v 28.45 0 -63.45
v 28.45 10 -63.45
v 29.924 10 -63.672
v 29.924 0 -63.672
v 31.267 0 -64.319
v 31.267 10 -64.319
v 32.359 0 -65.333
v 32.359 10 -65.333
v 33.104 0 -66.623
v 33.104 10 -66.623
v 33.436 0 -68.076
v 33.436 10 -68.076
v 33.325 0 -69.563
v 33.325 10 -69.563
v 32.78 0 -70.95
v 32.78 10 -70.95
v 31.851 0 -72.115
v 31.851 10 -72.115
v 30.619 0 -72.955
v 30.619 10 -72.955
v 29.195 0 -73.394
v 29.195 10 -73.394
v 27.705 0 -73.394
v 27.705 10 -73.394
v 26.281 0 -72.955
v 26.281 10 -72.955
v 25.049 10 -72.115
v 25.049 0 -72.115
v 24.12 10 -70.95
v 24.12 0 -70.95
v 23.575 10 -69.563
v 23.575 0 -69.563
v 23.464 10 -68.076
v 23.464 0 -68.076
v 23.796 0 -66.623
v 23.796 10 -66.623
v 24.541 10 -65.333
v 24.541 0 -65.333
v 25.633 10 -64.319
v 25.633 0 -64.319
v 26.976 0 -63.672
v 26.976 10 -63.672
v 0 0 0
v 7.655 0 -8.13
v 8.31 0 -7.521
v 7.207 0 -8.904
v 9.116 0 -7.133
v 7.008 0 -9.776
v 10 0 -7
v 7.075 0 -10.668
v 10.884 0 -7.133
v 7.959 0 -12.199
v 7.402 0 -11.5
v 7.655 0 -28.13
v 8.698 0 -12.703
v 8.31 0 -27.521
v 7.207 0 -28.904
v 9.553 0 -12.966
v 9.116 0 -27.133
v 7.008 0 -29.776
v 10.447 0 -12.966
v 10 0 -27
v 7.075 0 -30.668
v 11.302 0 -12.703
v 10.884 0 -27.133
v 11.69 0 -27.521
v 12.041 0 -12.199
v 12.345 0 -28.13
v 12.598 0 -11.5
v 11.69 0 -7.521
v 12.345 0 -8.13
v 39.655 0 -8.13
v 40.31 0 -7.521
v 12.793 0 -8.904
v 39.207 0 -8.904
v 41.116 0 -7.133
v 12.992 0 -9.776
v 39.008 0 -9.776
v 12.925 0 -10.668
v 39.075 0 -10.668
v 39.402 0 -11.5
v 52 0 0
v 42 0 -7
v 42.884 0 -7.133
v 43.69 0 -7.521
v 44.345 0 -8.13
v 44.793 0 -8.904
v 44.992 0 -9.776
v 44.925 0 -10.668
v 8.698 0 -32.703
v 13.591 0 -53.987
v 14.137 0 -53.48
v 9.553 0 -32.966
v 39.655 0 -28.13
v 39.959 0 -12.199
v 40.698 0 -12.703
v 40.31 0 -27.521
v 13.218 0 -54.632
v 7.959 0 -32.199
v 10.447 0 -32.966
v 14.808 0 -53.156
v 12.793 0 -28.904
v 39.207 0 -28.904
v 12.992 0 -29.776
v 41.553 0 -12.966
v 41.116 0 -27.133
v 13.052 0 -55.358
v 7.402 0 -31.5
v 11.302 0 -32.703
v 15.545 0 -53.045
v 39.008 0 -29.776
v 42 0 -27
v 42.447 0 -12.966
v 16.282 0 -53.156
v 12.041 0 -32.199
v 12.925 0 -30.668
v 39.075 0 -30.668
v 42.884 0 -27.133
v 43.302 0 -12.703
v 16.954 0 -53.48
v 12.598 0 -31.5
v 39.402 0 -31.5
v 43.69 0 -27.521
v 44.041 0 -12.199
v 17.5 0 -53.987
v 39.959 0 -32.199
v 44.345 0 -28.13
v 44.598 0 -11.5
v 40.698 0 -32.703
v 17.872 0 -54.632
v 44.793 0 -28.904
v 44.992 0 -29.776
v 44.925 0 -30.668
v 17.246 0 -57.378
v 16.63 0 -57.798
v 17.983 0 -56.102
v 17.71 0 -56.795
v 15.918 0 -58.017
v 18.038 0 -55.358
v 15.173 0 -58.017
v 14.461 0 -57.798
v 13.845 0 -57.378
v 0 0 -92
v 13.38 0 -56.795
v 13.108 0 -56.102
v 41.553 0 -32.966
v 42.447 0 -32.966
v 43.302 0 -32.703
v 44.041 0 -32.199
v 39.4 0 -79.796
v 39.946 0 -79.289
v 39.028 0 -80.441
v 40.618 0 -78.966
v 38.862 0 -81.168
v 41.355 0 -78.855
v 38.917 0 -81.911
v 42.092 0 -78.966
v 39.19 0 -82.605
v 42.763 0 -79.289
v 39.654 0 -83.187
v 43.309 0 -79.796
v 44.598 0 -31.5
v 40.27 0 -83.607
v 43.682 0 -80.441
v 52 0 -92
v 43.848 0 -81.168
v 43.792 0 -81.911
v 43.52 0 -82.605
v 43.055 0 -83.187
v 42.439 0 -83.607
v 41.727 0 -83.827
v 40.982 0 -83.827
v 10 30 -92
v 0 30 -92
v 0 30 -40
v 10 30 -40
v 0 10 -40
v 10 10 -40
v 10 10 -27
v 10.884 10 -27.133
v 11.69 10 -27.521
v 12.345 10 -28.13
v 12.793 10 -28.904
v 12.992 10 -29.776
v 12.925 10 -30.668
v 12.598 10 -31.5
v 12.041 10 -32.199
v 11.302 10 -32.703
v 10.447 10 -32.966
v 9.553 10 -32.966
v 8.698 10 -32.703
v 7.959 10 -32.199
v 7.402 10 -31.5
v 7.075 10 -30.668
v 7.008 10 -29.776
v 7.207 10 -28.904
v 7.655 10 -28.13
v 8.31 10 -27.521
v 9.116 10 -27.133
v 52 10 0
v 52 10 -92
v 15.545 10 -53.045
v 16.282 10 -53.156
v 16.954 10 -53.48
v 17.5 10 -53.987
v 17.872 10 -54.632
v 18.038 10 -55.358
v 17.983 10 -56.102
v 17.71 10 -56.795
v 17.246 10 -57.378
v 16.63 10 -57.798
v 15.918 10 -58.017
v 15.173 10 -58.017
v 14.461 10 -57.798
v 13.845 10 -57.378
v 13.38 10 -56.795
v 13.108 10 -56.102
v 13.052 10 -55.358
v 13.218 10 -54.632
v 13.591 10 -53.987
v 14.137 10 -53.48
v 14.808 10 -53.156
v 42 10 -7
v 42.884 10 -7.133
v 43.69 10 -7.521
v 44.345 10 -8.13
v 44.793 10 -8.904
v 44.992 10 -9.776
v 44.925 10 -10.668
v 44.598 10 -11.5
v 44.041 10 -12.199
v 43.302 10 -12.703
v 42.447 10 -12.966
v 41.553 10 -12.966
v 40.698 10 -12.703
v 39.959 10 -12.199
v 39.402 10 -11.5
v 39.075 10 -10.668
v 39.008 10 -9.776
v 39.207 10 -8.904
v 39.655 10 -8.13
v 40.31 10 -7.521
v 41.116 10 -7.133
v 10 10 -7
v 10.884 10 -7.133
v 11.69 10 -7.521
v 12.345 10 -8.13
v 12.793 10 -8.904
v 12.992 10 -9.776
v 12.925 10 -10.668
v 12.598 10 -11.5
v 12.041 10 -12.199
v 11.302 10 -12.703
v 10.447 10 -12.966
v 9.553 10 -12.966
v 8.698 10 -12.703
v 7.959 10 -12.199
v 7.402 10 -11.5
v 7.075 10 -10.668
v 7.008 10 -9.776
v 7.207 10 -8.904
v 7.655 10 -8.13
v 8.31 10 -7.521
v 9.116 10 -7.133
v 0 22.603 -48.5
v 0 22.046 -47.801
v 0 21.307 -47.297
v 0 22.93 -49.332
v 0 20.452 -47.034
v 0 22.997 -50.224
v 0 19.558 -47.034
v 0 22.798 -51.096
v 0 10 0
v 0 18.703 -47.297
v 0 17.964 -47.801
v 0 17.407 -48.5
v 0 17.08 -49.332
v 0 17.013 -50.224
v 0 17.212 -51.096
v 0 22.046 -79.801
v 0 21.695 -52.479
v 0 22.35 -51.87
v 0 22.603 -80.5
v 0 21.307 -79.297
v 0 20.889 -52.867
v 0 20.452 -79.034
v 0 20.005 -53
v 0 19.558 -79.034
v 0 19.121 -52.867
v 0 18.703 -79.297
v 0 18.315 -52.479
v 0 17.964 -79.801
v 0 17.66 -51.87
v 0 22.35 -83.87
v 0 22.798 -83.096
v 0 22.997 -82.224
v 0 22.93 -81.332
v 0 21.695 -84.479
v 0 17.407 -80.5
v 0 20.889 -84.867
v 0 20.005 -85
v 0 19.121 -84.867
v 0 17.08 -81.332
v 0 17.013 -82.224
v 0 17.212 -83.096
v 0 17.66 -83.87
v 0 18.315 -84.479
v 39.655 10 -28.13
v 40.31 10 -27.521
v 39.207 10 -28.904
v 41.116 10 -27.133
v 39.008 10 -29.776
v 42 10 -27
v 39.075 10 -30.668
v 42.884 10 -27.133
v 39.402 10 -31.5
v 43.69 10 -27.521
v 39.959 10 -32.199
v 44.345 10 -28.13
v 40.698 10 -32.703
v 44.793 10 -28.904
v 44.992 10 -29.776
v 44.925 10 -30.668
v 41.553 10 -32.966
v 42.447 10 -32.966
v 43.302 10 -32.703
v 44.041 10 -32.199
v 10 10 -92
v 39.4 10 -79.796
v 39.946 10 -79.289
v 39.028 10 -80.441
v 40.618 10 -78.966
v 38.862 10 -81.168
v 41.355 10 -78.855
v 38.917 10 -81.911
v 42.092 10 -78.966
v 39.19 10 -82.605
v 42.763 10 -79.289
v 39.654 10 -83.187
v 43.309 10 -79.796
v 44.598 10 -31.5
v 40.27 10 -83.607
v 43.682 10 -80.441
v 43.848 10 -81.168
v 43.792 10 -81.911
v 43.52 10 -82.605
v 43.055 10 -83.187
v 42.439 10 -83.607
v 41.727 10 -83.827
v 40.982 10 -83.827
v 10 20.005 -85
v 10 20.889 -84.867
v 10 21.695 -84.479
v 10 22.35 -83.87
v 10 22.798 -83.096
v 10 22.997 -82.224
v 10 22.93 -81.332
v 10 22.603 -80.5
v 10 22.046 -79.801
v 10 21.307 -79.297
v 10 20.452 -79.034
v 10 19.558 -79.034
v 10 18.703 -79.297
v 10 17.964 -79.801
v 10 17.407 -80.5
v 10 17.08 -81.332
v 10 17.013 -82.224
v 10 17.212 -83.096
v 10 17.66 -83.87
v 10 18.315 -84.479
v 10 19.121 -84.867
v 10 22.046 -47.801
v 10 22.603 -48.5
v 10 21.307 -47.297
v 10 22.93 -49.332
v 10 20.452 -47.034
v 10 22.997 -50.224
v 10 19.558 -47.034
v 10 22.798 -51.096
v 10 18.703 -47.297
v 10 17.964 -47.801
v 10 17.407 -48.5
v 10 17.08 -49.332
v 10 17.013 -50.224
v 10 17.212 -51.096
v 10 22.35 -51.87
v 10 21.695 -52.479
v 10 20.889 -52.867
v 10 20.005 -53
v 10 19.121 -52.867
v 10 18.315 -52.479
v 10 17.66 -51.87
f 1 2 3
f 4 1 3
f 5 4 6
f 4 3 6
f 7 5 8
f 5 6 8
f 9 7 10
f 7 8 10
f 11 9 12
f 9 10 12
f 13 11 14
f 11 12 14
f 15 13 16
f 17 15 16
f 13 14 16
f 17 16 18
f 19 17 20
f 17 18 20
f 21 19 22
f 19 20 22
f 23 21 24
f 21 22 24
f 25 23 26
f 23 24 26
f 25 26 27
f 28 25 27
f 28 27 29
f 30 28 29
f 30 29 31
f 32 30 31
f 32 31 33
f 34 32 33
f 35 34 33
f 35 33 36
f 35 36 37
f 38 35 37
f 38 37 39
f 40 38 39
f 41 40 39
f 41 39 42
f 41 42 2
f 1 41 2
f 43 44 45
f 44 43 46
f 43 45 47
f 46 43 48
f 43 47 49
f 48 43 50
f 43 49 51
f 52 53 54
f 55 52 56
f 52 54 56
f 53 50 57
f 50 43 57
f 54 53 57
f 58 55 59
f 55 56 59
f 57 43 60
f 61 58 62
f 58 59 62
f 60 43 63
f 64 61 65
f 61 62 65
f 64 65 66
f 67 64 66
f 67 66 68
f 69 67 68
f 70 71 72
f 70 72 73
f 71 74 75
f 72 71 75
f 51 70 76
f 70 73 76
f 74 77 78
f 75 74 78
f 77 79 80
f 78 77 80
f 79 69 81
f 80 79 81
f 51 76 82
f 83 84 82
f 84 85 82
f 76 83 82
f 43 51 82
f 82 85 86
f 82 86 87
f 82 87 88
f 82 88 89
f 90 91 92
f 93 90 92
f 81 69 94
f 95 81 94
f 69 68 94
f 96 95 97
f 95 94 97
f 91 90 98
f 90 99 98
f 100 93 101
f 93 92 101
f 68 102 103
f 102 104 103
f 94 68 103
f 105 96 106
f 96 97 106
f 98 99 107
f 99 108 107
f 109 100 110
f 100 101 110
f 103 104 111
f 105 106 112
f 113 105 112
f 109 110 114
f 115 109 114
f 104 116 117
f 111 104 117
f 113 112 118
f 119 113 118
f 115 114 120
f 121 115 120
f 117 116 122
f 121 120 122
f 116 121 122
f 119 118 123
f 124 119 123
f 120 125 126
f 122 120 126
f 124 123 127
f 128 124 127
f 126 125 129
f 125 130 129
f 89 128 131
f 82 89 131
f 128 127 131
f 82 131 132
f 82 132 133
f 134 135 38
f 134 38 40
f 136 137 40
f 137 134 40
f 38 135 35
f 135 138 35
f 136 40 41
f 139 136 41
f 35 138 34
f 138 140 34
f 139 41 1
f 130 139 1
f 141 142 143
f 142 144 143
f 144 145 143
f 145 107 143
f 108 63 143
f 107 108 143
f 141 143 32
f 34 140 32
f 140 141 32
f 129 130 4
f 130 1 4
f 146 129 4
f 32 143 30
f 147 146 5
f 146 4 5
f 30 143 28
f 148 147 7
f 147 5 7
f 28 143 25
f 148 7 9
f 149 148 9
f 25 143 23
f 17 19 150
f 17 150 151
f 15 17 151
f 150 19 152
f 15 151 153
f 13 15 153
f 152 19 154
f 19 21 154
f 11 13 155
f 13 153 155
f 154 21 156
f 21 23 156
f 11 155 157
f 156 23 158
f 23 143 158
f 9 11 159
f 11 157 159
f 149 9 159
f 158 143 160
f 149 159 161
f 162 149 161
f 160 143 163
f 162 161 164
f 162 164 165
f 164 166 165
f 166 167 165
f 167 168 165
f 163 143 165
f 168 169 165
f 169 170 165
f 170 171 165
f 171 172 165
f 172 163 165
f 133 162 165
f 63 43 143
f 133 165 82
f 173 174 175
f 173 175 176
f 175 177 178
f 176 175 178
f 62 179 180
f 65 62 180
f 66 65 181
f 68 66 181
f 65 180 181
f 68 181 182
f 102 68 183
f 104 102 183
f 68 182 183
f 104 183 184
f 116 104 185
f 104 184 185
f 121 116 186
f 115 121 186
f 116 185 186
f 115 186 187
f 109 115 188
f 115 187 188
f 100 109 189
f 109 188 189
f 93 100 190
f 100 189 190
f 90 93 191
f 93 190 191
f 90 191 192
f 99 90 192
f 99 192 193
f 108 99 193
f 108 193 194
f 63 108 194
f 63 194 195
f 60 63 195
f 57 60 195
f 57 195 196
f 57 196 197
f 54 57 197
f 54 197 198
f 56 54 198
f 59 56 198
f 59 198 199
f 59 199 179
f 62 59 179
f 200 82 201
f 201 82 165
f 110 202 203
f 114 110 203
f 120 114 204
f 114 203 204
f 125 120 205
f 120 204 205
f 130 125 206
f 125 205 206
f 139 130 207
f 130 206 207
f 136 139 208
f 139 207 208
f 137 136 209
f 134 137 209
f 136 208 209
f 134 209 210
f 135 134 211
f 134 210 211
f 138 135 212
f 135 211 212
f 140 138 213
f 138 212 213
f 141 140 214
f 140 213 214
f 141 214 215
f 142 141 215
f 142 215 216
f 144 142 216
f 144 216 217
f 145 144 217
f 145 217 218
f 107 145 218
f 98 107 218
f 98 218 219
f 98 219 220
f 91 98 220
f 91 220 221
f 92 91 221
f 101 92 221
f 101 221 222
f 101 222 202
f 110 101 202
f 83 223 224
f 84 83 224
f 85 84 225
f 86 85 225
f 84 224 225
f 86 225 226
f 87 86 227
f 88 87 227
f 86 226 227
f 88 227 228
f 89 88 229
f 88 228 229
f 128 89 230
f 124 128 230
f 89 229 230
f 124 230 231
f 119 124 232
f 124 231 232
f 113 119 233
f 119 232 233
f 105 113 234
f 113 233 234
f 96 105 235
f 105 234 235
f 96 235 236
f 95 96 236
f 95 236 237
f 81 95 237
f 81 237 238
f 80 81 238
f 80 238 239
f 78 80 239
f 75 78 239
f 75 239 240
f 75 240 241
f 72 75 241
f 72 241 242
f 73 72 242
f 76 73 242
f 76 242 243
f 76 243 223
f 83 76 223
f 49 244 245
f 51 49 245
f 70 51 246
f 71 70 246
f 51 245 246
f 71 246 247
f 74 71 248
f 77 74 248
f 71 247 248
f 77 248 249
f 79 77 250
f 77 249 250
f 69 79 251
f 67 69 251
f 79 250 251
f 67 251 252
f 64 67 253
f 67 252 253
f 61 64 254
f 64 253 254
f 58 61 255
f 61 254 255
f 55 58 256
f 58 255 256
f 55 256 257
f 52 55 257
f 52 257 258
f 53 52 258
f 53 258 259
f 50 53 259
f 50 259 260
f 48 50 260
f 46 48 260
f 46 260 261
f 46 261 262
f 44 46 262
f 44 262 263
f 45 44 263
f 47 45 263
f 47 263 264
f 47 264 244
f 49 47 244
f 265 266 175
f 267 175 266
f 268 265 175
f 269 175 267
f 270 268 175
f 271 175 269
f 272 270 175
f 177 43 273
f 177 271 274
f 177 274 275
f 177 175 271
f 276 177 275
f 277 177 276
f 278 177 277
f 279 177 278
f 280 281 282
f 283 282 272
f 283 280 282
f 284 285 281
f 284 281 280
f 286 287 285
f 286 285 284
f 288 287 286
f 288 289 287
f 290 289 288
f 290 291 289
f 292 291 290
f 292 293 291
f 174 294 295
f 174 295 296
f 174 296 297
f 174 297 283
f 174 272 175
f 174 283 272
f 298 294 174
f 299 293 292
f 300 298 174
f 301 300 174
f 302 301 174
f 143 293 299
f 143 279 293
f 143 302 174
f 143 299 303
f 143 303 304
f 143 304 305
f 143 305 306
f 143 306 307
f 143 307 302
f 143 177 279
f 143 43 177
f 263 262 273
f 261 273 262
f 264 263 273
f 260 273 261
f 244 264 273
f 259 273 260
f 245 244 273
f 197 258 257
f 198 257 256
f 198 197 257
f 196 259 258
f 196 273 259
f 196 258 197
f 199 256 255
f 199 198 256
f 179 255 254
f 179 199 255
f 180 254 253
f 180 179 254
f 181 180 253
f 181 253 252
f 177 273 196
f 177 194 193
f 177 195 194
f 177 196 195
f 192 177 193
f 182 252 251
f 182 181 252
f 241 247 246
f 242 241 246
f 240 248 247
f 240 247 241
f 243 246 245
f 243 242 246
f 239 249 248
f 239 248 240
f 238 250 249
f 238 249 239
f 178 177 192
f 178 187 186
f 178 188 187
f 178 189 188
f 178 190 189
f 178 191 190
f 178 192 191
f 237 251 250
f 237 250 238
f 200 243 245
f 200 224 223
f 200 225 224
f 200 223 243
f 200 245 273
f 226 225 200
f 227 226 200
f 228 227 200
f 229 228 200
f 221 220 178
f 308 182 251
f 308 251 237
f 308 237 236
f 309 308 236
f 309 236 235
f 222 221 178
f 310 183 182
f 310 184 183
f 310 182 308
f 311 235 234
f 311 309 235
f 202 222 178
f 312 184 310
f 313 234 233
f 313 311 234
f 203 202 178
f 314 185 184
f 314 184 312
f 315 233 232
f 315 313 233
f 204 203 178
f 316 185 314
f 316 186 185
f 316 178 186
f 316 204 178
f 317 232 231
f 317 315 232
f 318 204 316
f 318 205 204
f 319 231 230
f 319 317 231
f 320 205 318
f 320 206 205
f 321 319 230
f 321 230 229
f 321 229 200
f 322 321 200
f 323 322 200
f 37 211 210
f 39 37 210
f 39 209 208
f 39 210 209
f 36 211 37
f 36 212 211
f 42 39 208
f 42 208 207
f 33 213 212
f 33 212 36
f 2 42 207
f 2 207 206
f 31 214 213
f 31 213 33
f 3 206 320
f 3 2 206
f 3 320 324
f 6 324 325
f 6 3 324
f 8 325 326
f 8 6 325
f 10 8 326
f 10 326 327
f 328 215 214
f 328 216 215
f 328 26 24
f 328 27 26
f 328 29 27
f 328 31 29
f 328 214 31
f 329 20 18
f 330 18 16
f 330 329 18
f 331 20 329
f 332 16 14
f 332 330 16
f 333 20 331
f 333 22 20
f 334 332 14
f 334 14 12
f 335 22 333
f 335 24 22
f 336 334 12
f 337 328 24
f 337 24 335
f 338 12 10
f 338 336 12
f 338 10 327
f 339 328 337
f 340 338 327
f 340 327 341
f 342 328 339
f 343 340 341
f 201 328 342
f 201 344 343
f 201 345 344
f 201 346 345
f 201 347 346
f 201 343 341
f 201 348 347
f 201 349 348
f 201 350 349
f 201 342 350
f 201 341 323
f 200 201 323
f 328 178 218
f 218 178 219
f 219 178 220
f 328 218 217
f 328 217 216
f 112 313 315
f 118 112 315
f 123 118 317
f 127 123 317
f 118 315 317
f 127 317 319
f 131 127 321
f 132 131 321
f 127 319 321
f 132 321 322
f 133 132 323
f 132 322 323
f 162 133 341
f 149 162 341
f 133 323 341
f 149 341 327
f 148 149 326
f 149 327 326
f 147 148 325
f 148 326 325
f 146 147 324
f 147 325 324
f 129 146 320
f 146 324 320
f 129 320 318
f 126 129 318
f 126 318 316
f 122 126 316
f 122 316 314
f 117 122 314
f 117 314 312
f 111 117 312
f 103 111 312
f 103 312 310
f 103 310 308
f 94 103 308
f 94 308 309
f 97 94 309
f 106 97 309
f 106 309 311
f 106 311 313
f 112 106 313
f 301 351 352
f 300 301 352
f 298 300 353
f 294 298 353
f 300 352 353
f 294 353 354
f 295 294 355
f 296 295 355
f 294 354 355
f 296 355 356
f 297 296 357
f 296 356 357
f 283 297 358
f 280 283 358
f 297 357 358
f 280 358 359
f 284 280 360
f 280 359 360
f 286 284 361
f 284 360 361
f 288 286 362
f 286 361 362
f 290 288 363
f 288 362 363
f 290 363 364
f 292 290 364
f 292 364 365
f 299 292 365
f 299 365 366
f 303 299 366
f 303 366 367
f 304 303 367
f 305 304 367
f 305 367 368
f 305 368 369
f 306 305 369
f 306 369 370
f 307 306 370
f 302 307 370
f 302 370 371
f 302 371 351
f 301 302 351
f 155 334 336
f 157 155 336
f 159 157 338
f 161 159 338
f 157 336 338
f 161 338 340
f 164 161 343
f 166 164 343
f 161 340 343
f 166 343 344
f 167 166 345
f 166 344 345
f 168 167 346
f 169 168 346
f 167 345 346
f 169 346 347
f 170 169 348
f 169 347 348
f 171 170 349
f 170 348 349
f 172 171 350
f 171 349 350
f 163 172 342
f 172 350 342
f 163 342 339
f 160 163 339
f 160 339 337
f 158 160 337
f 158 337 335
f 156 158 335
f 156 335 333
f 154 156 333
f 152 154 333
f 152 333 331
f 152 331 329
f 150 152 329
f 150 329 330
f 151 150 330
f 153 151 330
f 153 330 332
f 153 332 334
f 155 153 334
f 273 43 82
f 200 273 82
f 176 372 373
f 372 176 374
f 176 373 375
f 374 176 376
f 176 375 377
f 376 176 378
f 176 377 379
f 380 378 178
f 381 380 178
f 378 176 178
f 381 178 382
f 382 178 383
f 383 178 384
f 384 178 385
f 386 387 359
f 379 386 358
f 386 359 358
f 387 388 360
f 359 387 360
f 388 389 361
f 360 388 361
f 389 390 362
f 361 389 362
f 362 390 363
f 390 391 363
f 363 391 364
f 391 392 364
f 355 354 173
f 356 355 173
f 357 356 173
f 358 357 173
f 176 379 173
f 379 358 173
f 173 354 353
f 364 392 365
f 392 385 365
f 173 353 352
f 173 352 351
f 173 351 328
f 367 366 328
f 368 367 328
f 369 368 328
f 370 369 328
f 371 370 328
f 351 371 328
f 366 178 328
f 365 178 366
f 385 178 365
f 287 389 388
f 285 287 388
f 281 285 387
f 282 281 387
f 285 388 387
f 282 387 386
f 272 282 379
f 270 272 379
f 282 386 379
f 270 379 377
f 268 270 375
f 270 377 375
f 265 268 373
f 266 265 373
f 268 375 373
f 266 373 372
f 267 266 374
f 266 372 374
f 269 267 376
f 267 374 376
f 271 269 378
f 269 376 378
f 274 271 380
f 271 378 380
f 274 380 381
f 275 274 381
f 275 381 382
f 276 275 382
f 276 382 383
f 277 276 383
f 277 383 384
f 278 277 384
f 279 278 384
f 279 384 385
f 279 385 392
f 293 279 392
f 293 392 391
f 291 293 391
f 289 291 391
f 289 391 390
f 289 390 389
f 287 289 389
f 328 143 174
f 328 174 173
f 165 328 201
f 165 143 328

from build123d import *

# Parameters (mm, degrees)
SKETCH1_W           = 52
SKETCH1_H           = 92
BOSS_EXTRUDE1_DEPTH = 10
SKETCH2_W           = 10
SKETCH2_H           = 52
BOSS_EXTRUDE2_DEPTH = 20
CUT_EXTRUDE1_REACH  = 109.555
SKETCH3_R           = 3
SKETCH3_R_2         = 5
SKETCH3_R_3         = 2.5
CUT_EXTRUDE2_REACH  = 107.489
SKETCH4_R           = 3


with BuildPart() as part:
    # Sketch1 → Boss-Extrude1 (new body)
    with BuildSketch(Plane(origin=(0, 0, 0), x_dir=(1, 0, 0), z_dir=(0, 1, 0))):
        with Locations((26, 46)):
            Rectangle(SKETCH1_W, SKETCH1_H)
    extrude(amount=BOSS_EXTRUDE1_DEPTH)

    # Sketch2 → Boss-Extrude2 (add)
    with BuildSketch(Plane(origin=(0, 10, 0), x_dir=(1, 0, 0), z_dir=(0, 1, 0))):
        with Locations((5, 66)):
            Rectangle(SKETCH2_W, SKETCH2_H)
    extrude(amount=BOSS_EXTRUDE2_DEPTH)

    # Sketch3 → Cut-Extrude1 (cut, up to next)
    with BuildSketch(Plane(origin=(0, 10, 0), x_dir=(1, 0, 0), z_dir=(0, 1, 0)), mode=Mode.PRIVATE) as cut_extrude1_sk1:
        with Locations(Location((42, 30, 0), (0, 0, 270))):
            Circle(SKETCH3_R)
    cut_extrude1_tool1 = extrude(cut_extrude1_sk1.sketch, amount=-CUT_EXTRUDE1_REACH, mode=Mode.PRIVATE) & part.part
    # Sketch3 → Cut-Extrude1 (cut, up to next)
    with BuildSketch(Plane(origin=(0, 10, 0), x_dir=(1, 0, 0), z_dir=(0, 1, 0)), mode=Mode.PRIVATE) as cut_extrude1_sk2:
        with Locations(Location((10, 30, 0), (0, 0, 270))):
            Circle(SKETCH3_R)
    cut_extrude1_tool2 = extrude(cut_extrude1_sk2.sketch, amount=-CUT_EXTRUDE1_REACH, mode=Mode.PRIVATE) & part.part
    # Sketch3 → Cut-Extrude1 (cut, up to next)
    with BuildSketch(Plane(origin=(0, 10, 0), x_dir=(1, 0, 0), z_dir=(0, 1, 0)), mode=Mode.PRIVATE) as cut_extrude1_sk3:
        with Locations(Location((42, 10, 0), (0, 0, 270))):
            Circle(SKETCH3_R)
    cut_extrude1_tool3 = extrude(cut_extrude1_sk3.sketch, amount=-CUT_EXTRUDE1_REACH, mode=Mode.PRIVATE) & part.part
    # Sketch3 → Cut-Extrude1 (cut, up to next)
    with BuildSketch(Plane(origin=(0, 10, 0), x_dir=(1, 0, 0), z_dir=(0, 1, 0)), mode=Mode.PRIVATE) as cut_extrude1_sk4:
        with Locations(Location((10, 10, 0), (0, 0, 270))):
            Circle(SKETCH3_R)
    cut_extrude1_tool4 = extrude(cut_extrude1_sk4.sketch, amount=-CUT_EXTRUDE1_REACH, mode=Mode.PRIVATE) & part.part
    # Sketch3 → Cut-Extrude1 (cut, up to next)
    with BuildSketch(Plane(origin=(0, 10, 0), x_dir=(1, 0, 0), z_dir=(0, 1, 0)), mode=Mode.PRIVATE) as cut_extrude1_sk5:
        with Locations(Location((28.45, 68.45, 0), (0, 0, 270))):
            Circle(SKETCH3_R_2)
    cut_extrude1_tool5 = extrude(cut_extrude1_sk5.sketch, amount=-CUT_EXTRUDE1_REACH, mode=Mode.PRIVATE) & part.part
    # Sketch3 → Cut-Extrude1 (cut, up to next)
    with BuildSketch(Plane(origin=(0, 10, 0), x_dir=(1, 0, 0), z_dir=(0, 1, 0)), mode=Mode.PRIVATE) as cut_extrude1_sk6:
        with Locations(Location((41.354698757, 81.354698757, 0), (0, 0, 270))):
            Circle(SKETCH3_R_3)
    cut_extrude1_tool6 = extrude(cut_extrude1_sk6.sketch, amount=-CUT_EXTRUDE1_REACH, mode=Mode.PRIVATE) & part.part
    # Sketch3 → Cut-Extrude1 (cut, up to next)
    with BuildSketch(Plane(origin=(0, 10, 0), x_dir=(1, 0, 0), z_dir=(0, 1, 0)), mode=Mode.PRIVATE) as cut_extrude1_sk7:
        with Locations(Location((15.545301243, 55.545301243, 0), (0, 0, 270))):
            Circle(SKETCH3_R_3)
    cut_extrude1_tool7 = extrude(cut_extrude1_sk7.sketch, amount=-CUT_EXTRUDE1_REACH, mode=Mode.PRIVATE) & part.part
    add(cut_extrude1_tool1.solids().sort_by_distance((42, 10, -30))[0], mode=Mode.SUBTRACT)
    add(cut_extrude1_tool2.solids().sort_by_distance((10, 10, -30))[0], mode=Mode.SUBTRACT)
    add(cut_extrude1_tool3.solids().sort_by_distance((42, 10, -10))[0], mode=Mode.SUBTRACT)
    add(cut_extrude1_tool4.solids().sort_by_distance((10, 10, -10))[0], mode=Mode.SUBTRACT)
    add(cut_extrude1_tool5.solids().sort_by_distance((28.45, 10, -68.45))[0], mode=Mode.SUBTRACT)
    add(cut_extrude1_tool6.solids().sort_by_distance((41.354699, 10, -81.354699))[0], mode=Mode.SUBTRACT)
    add(cut_extrude1_tool7.solids().sort_by_distance((15.545301, 10, -55.545301))[0], mode=Mode.SUBTRACT)

    # Sketch4 → Cut-Extrude2 (cut, up to next)
    with BuildSketch(Plane(origin=(10, 0, 0), x_dir=(0, 0, -1), z_dir=(1, 0, 0)), mode=Mode.PRIVATE) as cut_extrude2_sk1:
        with Locations((50, 20.005)):
            Circle(SKETCH4_R)
    cut_extrude2_tool1 = extrude(cut_extrude2_sk1.sketch, amount=-CUT_EXTRUDE2_REACH, mode=Mode.PRIVATE) & part.part
    # Sketch4 → Cut-Extrude2 (cut, up to next)
    with BuildSketch(Plane(origin=(10, 0, 0), x_dir=(0, 0, -1), z_dir=(1, 0, 0)), mode=Mode.PRIVATE) as cut_extrude2_sk2:
        with Locations((82, 20.005)):
            Circle(SKETCH4_R)
    cut_extrude2_tool2 = extrude(cut_extrude2_sk2.sketch, amount=-CUT_EXTRUDE2_REACH, mode=Mode.PRIVATE) & part.part
    add(cut_extrude2_tool1.solids().sort_by_distance((10, 20.005, -50))[0], mode=Mode.SUBTRACT)
    add(cut_extrude2_tool2.solids().sort_by_distance((10, 20.005, -82))[0], mode=Mode.SUBTRACT)


solid = part.part
